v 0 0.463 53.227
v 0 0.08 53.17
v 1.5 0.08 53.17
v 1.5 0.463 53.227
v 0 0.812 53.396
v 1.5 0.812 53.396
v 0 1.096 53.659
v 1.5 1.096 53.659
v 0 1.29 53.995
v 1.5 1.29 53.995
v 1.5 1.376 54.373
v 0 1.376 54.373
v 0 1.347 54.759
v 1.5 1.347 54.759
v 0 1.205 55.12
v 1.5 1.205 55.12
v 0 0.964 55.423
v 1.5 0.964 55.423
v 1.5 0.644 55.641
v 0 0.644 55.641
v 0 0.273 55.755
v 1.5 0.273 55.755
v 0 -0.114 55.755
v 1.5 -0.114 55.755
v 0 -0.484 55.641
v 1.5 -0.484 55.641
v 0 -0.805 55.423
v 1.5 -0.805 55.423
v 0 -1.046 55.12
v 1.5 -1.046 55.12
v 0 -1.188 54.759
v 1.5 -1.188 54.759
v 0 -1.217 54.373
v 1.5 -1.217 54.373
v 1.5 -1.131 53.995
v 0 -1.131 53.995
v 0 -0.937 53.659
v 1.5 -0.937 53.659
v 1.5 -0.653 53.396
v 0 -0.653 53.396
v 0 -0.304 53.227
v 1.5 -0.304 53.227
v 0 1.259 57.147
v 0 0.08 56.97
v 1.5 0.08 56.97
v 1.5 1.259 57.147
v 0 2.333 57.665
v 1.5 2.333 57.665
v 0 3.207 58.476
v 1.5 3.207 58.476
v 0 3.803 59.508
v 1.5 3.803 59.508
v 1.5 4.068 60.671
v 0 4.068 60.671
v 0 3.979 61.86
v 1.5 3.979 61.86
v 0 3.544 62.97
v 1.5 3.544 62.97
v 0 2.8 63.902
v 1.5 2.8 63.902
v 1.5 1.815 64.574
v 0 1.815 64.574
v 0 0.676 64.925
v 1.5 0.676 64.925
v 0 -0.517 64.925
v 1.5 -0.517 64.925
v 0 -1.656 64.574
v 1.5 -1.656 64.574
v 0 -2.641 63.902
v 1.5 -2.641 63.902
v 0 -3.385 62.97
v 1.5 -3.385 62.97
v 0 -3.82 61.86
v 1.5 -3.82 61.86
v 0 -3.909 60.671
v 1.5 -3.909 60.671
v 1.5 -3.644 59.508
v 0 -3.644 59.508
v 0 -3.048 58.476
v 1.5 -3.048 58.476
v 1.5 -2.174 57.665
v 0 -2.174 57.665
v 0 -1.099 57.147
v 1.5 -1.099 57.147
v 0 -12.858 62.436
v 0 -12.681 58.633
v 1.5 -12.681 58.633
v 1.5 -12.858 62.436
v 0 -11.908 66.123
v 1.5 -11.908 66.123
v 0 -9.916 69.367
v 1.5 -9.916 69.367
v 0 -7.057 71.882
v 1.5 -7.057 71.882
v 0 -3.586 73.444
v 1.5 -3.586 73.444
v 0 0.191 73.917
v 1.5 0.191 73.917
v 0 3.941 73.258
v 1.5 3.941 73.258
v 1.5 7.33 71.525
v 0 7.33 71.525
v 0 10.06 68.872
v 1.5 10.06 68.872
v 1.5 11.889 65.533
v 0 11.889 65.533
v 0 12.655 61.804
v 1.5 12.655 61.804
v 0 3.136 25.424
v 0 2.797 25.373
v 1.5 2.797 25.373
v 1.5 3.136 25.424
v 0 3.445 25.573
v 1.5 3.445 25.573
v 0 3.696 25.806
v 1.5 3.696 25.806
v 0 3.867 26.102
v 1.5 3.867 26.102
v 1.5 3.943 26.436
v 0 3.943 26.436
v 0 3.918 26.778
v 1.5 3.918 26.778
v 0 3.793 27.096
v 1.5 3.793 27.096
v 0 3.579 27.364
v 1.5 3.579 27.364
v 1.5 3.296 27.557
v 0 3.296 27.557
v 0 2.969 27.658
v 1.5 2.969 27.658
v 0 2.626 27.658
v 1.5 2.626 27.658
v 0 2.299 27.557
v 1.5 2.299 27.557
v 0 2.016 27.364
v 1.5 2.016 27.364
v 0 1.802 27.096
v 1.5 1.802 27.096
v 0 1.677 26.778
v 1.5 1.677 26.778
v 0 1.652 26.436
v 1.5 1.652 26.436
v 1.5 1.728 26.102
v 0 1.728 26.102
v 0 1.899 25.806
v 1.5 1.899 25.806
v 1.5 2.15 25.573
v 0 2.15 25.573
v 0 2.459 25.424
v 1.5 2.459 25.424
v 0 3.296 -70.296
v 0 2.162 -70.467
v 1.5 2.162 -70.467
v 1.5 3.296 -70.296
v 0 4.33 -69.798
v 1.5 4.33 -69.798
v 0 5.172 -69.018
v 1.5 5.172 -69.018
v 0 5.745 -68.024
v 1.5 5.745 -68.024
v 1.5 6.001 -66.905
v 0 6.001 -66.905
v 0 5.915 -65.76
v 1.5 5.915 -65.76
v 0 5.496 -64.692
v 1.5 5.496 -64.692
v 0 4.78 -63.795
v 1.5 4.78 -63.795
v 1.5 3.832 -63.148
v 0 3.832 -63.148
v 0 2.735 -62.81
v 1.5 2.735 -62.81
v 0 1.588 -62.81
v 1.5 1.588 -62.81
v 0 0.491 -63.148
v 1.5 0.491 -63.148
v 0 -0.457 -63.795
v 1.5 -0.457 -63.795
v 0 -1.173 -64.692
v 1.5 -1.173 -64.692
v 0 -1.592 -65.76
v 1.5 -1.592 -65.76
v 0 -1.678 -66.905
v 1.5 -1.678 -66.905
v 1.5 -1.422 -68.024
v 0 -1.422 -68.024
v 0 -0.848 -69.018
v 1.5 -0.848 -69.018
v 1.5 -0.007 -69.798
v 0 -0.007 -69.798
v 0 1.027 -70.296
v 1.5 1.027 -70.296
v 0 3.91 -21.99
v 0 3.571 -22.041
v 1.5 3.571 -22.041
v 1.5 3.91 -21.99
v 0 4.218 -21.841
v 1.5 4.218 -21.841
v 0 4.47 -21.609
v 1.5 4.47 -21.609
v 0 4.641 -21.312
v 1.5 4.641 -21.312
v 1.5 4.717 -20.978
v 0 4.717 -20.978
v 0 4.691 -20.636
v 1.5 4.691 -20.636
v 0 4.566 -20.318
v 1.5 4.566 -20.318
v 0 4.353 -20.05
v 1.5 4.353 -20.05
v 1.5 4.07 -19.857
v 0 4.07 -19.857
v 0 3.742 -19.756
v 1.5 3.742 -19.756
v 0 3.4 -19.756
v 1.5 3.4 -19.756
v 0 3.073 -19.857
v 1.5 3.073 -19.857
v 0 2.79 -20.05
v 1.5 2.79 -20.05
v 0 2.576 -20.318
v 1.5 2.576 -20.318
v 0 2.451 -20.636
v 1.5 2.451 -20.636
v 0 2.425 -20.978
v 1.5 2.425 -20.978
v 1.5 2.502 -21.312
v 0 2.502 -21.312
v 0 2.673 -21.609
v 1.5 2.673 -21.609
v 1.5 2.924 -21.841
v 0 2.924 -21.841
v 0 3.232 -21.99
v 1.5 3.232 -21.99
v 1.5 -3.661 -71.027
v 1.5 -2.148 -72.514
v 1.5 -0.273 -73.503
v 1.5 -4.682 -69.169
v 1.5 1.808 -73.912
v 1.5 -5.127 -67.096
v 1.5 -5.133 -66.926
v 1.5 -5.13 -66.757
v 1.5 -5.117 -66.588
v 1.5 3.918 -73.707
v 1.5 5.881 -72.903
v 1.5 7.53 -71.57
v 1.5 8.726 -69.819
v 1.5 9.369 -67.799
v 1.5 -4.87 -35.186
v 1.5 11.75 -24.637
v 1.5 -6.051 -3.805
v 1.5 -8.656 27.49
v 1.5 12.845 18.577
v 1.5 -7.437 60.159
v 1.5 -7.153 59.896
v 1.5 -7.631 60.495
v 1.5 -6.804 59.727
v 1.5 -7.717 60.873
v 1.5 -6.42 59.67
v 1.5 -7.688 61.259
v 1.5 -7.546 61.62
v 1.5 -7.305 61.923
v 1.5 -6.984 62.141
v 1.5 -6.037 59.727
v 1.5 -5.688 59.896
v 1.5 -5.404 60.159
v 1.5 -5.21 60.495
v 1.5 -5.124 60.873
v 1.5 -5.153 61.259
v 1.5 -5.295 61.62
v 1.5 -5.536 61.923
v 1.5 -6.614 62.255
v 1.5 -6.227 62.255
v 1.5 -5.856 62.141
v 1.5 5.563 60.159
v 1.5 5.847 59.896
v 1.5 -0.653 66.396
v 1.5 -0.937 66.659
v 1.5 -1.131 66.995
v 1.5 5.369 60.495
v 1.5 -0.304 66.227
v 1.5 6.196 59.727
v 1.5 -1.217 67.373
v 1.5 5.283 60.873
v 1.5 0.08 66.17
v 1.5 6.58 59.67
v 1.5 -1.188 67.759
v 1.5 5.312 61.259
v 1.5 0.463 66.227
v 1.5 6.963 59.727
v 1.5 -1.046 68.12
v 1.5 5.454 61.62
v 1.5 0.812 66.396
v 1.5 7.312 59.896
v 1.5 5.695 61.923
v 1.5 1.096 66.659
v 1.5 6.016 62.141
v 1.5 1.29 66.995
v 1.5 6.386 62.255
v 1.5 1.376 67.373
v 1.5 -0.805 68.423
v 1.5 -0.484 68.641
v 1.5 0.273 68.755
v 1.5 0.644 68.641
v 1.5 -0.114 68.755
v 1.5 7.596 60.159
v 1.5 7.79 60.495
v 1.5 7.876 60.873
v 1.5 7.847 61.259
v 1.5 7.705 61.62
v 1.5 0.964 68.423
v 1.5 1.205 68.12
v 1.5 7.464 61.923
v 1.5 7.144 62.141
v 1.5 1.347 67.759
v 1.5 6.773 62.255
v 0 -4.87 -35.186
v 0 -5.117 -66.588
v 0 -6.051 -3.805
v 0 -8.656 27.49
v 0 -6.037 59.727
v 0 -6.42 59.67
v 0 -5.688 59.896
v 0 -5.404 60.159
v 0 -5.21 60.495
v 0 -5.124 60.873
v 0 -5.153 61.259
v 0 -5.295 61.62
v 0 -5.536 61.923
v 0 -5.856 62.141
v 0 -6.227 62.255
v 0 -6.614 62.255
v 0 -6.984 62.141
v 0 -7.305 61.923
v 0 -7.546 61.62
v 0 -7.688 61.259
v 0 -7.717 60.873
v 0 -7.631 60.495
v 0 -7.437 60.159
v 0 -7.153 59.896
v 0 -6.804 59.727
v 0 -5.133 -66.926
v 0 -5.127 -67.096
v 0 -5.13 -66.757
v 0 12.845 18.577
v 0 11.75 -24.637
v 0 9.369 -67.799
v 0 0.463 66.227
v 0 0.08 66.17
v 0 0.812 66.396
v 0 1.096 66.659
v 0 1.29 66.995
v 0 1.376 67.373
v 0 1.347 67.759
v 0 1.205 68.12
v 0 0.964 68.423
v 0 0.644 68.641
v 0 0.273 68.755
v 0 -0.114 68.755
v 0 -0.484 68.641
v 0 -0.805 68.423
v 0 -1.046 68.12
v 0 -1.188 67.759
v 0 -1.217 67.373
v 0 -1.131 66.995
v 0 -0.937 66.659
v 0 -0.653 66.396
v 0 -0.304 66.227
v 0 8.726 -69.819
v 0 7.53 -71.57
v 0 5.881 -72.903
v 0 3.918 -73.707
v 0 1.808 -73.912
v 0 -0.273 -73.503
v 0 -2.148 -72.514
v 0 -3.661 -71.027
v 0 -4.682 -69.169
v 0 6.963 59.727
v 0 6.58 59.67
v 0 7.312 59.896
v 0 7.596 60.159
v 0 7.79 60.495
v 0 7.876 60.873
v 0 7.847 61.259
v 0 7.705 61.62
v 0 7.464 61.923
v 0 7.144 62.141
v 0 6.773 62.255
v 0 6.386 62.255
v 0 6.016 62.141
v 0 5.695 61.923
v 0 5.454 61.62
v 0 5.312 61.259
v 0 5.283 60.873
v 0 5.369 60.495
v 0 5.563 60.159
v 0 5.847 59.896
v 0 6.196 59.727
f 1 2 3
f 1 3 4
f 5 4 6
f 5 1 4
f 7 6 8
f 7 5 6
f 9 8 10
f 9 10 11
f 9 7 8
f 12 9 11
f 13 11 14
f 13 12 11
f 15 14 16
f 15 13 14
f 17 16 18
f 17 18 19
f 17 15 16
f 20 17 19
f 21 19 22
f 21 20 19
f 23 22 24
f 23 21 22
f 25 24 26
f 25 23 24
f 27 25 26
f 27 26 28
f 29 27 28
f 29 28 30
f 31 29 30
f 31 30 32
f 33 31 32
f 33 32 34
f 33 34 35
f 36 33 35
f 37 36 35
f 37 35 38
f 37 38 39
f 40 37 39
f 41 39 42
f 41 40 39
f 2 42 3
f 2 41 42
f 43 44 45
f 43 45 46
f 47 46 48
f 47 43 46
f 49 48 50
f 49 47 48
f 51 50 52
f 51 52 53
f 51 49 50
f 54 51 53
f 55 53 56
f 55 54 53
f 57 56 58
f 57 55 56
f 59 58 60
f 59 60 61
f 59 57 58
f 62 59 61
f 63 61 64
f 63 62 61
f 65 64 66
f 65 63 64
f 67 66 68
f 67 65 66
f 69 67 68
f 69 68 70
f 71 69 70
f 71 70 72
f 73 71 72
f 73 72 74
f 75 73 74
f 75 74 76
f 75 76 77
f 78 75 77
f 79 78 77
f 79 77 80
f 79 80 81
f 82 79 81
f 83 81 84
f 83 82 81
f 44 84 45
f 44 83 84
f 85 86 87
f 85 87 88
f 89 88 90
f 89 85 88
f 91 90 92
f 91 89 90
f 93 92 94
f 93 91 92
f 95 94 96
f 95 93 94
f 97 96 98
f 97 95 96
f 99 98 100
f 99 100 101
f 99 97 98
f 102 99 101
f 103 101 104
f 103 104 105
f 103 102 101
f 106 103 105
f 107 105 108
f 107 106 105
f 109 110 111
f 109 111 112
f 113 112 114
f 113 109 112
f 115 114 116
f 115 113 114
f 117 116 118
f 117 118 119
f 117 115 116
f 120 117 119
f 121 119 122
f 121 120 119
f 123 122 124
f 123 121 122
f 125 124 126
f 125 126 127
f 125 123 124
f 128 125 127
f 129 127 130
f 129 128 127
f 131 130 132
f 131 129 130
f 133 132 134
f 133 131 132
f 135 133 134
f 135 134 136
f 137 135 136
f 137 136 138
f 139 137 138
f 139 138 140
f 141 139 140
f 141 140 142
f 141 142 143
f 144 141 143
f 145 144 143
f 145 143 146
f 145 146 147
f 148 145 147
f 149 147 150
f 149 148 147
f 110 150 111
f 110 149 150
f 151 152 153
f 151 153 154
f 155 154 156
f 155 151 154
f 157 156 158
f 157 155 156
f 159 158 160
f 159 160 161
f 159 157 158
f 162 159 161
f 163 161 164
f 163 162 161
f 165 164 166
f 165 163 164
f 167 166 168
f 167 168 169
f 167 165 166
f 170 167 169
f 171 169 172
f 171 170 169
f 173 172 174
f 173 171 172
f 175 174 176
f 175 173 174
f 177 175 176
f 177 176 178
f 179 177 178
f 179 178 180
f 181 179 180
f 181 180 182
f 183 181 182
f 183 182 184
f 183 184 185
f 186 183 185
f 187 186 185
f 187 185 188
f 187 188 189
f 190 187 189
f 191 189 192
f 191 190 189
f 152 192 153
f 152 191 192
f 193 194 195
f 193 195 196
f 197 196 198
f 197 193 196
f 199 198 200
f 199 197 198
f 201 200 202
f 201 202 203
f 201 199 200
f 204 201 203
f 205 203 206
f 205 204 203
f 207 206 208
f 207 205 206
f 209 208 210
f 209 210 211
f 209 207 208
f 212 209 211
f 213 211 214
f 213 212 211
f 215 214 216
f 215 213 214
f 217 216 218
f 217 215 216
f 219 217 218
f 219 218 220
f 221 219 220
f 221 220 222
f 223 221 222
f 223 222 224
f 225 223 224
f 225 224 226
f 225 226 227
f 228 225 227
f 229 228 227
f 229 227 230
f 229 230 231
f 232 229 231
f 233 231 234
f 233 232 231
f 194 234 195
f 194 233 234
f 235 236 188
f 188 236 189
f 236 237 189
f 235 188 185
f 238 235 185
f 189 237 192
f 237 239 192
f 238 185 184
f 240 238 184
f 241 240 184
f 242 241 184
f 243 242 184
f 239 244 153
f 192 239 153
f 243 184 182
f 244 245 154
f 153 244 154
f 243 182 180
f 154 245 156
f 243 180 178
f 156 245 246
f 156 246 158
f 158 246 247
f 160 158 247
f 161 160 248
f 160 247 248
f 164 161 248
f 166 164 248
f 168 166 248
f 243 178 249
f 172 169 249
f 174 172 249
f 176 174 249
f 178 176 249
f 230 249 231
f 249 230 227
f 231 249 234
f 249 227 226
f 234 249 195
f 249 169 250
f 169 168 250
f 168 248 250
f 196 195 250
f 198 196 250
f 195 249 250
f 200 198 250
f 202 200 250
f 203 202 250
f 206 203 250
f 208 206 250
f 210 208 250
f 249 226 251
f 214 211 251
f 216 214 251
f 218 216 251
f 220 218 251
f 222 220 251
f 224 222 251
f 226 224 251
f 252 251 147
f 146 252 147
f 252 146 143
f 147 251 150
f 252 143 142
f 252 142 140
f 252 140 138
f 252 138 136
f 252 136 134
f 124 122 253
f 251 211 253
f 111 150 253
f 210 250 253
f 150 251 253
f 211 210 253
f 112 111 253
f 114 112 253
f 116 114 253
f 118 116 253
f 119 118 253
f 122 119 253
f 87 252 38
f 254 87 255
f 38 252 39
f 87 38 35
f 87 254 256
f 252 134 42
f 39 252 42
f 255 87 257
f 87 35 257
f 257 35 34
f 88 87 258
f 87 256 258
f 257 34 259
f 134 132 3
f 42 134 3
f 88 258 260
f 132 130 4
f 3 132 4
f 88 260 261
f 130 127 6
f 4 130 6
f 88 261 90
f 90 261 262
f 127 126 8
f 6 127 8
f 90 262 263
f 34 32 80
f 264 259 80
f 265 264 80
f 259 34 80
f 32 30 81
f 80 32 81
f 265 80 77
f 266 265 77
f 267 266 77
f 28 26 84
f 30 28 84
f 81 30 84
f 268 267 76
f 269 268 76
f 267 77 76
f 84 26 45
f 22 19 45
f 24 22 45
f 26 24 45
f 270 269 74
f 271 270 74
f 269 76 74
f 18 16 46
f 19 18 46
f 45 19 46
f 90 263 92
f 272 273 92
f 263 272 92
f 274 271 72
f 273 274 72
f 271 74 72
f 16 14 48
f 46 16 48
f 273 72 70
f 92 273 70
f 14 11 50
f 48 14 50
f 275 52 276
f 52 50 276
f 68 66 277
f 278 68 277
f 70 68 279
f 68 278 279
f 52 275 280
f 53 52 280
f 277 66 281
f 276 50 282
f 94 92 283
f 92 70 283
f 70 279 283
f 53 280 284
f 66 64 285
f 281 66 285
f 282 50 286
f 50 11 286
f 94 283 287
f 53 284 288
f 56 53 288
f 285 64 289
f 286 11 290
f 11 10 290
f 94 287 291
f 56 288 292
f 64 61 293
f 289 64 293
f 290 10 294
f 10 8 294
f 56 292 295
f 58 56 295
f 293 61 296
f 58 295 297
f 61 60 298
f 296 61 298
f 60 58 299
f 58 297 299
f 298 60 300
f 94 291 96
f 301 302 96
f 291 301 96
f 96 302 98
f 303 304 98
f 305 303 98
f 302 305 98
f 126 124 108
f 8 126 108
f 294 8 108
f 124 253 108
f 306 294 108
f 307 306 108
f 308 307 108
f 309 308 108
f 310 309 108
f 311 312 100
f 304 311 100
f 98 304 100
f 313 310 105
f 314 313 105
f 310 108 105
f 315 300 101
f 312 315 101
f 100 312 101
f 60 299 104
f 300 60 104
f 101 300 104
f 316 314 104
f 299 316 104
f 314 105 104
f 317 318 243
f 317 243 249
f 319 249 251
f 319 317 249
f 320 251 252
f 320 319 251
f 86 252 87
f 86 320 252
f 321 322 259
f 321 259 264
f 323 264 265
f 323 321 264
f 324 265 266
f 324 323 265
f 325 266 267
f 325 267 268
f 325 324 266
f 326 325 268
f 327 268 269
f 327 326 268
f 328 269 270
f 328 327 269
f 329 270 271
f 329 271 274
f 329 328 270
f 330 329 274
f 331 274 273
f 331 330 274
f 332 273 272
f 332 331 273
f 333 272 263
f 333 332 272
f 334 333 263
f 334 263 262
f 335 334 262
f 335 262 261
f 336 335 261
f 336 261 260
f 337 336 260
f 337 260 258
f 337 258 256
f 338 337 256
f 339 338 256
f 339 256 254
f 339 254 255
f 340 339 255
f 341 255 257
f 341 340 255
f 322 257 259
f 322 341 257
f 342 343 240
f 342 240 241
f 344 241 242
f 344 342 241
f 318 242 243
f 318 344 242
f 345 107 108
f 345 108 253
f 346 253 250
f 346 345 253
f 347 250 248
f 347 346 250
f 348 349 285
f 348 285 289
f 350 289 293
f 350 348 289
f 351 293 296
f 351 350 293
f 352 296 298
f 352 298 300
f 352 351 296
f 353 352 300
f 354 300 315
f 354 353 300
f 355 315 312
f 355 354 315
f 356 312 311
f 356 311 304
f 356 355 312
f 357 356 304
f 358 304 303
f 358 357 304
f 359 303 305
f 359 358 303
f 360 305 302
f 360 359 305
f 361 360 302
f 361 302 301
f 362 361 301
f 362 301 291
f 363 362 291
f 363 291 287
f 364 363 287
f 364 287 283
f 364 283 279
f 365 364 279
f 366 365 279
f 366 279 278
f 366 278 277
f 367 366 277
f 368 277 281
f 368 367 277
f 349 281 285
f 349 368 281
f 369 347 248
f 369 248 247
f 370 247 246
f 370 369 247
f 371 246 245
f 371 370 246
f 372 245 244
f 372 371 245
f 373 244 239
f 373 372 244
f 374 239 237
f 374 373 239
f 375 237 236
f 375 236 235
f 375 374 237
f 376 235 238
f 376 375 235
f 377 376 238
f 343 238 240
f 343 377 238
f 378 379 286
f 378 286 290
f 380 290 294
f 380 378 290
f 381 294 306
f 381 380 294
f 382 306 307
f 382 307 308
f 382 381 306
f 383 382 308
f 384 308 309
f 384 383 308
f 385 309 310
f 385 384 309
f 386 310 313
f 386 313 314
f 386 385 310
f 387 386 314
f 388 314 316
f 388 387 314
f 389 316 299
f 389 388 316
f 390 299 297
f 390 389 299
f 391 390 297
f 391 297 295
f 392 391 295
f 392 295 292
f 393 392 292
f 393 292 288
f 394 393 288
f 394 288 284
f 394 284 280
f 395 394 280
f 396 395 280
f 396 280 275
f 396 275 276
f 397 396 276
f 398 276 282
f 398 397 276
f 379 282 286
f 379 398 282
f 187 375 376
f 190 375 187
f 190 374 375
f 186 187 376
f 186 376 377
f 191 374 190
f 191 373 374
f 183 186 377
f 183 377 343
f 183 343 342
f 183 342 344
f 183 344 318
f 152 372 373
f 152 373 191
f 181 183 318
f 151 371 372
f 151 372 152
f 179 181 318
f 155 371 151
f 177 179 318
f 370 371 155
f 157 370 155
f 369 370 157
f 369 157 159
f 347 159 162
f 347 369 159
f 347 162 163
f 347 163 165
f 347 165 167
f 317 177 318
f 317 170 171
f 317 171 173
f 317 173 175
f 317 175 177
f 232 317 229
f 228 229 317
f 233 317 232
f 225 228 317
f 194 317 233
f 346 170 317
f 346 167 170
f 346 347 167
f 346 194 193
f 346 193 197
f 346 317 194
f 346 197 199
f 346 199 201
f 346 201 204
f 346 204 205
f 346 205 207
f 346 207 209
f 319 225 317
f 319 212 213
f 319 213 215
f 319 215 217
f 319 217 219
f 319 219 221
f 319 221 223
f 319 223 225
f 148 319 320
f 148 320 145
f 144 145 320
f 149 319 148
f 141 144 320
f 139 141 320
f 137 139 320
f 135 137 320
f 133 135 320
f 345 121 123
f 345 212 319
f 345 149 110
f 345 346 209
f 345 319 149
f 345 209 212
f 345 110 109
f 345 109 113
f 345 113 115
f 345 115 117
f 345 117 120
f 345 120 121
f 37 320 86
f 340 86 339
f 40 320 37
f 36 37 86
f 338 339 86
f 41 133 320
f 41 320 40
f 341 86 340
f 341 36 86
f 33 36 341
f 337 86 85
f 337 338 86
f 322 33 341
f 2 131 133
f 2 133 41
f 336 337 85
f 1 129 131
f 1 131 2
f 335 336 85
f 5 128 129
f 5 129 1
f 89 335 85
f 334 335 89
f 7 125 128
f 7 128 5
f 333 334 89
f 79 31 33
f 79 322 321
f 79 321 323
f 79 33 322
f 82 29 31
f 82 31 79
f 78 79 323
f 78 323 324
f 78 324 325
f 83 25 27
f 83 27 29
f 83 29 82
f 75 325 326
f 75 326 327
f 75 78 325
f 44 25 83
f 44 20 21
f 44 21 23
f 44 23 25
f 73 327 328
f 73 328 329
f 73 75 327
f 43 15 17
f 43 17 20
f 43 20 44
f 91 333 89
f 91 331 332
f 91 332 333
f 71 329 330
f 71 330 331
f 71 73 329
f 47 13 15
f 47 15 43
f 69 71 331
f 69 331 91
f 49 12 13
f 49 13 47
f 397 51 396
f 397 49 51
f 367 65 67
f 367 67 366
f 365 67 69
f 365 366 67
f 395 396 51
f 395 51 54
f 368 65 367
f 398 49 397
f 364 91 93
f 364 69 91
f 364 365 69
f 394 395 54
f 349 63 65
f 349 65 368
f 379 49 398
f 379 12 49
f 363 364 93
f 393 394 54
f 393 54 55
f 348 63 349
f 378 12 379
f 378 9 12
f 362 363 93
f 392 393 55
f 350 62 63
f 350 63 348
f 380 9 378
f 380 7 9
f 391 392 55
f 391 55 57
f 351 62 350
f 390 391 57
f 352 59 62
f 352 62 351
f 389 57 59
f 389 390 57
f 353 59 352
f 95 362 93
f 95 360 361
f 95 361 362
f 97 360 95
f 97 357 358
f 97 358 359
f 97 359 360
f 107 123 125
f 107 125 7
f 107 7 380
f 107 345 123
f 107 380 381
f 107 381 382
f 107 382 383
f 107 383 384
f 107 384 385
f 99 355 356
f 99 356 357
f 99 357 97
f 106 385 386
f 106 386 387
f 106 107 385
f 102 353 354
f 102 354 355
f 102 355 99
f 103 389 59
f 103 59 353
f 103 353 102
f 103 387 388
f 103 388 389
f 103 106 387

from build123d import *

# Parameters (mm, degrees)
SKETCH_1_R      = 1.3
SKETCH_1_R_2    = 3.85
SKETCH_1_R_3    = 4
SKETCH_1_R_4    = 1.149031008
EXTRUDE_1_DEPTH = 1.5


with BuildPart() as part:
    # 草圖1 → 填料-伸長1 (new body)
    with BuildSketch(Plane(origin=(0, 0, 0), x_dir=(0, 0, -1), z_dir=(1, 0, 0))):
        with BuildLine():
            ThreePointArc((66.587683924, -5.116627236), (3.80507147, -6.050846657), (-58.633451622, -12.681082444))
            ThreePointArc((-58.633451622, -12.681082444), (-73.821962275, -1.715080477), (-61.804017134, 12.655481431))
            ThreePointArc((-61.804017134, 12.655481431), (3.033906142, 12.458288366), (67.798504291, 9.369274541))
            ThreePointArc((67.798504291, 9.369274541), (73.912446594, 1.807845069), (67.095645487, -5.12661445))
            ThreePointArc((67.095645487, -5.12661445), (66.8414518, -5.132449469), (66.587683924, -5.116627236))
        make_face()
        with Locations((-67.469663313, 0.079585479)):
            Circle(SKETCH_1_R, mode=Mode.SUBTRACT)
        with Locations((-54.469663313, 0.079585479)):
            Circle(SKETCH_1_R, mode=Mode.SUBTRACT)
        with Locations((-60.969663313, 6.579585479)):
            Circle(SKETCH_1_R, mode=Mode.SUBTRACT)
        with Locations((-60.969663313, -6.420414521)):
            Circle(SKETCH_1_R, mode=Mode.SUBTRACT)
        with Locations((66.61714054, 2.16157088)):
            Circle(SKETCH_1_R_2, mode=Mode.SUBTRACT)
        with Locations((-60.969663313, 0.079585479)):
            Circle(SKETCH_1_R_3, mode=Mode.SUBTRACT)
        with Locations((20.89210292, 3.571177524)):
            Circle(SKETCH_1_R_4, mode=Mode.SUBTRACT)
        with Locations((-26.521912025, 2.797466734)):
            Circle(SKETCH_1_R_4, mode=Mode.SUBTRACT)
    extrude(amount=EXTRUDE_1_DEPTH)


solid = part.part
